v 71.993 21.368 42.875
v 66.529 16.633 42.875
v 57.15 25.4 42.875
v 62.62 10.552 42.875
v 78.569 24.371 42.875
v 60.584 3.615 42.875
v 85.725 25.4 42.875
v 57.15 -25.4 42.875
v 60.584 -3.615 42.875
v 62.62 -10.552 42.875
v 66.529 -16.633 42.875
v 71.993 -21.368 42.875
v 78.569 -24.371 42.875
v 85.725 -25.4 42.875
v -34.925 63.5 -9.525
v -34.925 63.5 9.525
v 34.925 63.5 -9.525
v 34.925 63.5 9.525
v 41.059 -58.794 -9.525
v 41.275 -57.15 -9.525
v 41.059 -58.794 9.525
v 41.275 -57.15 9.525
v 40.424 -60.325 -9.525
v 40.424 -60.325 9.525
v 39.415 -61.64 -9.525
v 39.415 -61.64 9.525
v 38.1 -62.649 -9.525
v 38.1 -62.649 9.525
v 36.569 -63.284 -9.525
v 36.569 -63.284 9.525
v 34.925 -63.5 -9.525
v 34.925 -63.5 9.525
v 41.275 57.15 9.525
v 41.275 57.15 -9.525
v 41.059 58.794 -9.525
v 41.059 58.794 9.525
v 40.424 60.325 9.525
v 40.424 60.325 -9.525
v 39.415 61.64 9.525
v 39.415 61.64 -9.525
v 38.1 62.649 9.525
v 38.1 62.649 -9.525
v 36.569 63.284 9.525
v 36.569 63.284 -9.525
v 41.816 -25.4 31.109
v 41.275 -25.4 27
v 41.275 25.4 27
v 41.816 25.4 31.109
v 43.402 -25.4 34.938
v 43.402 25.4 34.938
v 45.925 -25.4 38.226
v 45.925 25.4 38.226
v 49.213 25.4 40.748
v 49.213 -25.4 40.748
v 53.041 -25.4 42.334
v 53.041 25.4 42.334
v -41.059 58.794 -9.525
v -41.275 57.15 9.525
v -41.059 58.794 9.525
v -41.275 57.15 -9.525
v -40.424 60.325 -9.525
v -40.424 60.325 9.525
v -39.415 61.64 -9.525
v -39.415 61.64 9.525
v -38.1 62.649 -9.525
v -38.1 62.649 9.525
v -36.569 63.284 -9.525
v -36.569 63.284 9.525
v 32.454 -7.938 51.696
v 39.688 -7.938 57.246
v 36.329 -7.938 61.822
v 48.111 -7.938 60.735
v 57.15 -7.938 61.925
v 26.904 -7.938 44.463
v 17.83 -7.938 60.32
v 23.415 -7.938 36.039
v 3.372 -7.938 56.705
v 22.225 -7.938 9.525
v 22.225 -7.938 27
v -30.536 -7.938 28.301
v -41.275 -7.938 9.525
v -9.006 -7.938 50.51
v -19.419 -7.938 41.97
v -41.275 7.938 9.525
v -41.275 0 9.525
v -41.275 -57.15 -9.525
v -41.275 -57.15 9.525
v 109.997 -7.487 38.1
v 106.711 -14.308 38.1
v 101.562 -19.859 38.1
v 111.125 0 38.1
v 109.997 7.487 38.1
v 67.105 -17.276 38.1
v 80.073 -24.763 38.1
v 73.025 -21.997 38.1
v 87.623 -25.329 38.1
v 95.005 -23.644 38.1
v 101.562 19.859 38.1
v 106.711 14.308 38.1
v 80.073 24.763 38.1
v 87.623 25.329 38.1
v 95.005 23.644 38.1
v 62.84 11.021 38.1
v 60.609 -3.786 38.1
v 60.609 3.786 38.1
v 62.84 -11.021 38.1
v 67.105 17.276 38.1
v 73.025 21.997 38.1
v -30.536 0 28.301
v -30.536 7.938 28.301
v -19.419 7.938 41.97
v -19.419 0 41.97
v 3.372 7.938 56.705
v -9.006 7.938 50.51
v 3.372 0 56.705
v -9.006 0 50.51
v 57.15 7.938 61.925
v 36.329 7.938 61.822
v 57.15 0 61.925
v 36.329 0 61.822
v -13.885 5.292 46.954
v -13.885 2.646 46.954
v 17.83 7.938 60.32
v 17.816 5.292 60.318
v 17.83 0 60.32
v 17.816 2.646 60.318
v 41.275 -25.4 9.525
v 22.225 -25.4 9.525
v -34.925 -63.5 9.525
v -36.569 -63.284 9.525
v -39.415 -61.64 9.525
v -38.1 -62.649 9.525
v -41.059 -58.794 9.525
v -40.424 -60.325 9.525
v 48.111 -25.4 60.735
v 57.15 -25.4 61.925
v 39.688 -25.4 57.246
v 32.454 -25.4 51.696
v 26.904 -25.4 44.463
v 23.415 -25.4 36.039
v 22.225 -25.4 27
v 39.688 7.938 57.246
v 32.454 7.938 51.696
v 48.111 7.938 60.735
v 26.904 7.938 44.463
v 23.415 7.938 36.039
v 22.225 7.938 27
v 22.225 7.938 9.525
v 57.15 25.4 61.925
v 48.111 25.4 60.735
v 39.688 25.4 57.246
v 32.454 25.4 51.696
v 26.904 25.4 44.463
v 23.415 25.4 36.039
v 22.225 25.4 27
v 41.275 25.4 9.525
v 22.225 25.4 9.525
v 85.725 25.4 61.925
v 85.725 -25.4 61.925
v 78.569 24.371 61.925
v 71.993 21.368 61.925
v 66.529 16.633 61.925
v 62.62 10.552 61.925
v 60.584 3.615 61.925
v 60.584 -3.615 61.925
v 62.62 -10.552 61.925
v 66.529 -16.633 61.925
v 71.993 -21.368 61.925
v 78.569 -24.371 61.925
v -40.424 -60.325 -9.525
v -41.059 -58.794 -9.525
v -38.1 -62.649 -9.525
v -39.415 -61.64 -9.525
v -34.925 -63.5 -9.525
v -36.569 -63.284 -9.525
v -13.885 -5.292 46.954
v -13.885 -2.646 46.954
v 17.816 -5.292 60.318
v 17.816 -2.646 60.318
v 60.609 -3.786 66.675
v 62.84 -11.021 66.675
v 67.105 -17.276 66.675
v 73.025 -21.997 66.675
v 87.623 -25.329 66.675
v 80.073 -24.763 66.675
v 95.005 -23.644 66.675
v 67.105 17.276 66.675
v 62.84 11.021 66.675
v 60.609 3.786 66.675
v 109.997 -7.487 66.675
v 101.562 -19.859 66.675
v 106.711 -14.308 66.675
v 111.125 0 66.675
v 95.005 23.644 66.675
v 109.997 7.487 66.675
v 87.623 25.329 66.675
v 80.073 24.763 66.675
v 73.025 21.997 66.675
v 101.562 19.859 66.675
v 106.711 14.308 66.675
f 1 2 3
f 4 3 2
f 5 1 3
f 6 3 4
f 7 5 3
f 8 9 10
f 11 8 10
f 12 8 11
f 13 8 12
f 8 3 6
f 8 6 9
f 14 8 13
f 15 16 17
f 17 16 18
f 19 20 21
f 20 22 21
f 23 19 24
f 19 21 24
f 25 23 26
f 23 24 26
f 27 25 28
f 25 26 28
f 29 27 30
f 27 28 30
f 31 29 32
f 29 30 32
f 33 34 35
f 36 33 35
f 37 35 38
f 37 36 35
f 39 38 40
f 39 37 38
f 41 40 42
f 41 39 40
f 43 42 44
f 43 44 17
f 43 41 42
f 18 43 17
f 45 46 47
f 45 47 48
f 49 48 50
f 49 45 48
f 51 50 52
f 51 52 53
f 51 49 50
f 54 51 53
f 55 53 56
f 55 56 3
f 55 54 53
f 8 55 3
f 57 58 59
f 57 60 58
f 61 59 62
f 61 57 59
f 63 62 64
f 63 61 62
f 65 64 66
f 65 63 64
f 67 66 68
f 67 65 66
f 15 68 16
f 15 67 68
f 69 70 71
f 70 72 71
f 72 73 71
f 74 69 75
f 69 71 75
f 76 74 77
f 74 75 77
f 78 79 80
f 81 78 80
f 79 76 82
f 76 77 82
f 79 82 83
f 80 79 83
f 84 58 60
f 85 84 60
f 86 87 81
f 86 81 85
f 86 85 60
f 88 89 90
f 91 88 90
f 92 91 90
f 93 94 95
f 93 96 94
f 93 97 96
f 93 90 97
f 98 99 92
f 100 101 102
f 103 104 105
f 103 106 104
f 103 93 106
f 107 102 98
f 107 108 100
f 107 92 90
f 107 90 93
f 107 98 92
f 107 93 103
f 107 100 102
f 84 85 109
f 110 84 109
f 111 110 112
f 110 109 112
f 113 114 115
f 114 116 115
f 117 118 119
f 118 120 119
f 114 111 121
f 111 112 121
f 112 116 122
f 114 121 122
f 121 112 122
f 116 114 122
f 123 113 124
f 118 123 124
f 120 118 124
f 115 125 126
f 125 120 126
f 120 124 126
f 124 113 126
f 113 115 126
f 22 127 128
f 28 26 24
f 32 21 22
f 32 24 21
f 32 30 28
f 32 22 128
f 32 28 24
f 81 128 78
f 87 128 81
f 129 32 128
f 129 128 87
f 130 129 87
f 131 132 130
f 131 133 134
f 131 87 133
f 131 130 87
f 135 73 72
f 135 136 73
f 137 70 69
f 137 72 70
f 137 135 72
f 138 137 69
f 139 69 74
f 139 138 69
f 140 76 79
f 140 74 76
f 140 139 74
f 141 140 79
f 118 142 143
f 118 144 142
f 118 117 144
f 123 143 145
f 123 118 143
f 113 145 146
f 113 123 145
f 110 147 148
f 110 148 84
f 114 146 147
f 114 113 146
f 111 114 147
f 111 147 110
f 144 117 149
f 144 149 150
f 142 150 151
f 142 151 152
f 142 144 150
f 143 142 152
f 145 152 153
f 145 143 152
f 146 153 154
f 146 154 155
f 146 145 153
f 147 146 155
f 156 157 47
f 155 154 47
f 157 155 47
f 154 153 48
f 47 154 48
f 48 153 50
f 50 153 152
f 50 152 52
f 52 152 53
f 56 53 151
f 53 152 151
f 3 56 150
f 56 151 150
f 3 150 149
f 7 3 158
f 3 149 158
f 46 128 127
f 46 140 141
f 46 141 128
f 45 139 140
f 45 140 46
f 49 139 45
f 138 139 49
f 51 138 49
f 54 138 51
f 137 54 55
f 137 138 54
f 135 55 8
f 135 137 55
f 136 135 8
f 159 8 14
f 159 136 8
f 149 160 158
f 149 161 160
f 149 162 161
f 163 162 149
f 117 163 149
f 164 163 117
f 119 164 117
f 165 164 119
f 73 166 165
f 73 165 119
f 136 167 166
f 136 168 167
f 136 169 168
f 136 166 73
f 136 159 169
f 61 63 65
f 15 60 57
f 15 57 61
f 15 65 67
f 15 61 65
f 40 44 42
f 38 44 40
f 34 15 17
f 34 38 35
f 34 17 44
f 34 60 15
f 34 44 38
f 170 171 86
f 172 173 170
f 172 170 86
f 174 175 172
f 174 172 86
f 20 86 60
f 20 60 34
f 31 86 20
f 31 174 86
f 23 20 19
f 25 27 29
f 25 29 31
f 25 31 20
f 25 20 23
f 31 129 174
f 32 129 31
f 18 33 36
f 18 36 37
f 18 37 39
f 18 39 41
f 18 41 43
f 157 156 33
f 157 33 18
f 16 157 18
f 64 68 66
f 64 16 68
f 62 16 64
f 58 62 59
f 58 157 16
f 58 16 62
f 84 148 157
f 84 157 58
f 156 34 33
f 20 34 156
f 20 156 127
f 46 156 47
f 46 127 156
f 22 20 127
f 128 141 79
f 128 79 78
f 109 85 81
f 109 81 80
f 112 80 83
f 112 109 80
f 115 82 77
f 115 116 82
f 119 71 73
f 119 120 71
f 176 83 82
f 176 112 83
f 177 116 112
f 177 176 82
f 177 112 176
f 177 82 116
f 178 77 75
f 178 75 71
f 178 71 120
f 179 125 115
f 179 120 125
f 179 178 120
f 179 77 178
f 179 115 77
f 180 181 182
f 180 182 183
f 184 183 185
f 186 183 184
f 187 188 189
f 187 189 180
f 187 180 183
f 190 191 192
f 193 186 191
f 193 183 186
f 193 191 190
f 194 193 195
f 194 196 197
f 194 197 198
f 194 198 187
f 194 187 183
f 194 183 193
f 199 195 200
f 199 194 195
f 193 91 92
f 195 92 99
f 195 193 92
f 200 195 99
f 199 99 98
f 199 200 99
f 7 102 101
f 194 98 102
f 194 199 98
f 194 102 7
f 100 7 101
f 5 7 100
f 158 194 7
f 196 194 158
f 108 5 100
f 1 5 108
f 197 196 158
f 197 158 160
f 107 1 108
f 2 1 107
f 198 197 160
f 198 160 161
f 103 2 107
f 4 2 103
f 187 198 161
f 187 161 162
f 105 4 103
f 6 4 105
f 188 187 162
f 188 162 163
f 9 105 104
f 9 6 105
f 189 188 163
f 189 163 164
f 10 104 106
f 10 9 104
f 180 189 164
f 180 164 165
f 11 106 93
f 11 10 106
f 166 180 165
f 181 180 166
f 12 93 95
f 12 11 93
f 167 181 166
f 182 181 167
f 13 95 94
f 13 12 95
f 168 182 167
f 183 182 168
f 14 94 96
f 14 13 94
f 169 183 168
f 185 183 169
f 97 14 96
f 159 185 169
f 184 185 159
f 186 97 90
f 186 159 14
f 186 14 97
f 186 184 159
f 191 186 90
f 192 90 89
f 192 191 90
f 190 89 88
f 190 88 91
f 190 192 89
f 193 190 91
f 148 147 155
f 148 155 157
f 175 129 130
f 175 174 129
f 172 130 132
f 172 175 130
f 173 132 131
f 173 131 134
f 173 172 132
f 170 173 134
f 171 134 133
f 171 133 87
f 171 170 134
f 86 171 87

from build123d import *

# Parameters (mm, degrees)
F1_DEPTH = 63.5
F2_DEPTH = 25.4
F3_DEPTH = 7.9375
F5_R     = 6.35


with BuildPart() as f1:
    # F0 (on Front) → F1 (new body, symmetric)
    with BuildSketch(Plane.XZ):
        Polygon((-41.275, 9.525), (-41.275, -9.525), (41.275, -9.525), (41.275, 9.525), (22.225, 9.525), align=None)
    extrude(amount=F1_DEPTH, both=True)

    # F0 (on Front) → F2 (join, symmetric)
    with BuildSketch(Plane.XZ):
        with BuildLine():
            Line((22.225, 9.525), (41.275, 9.525))
            Line((41.275, 9.525), (41.275, 27.0002))
            ThreePointArc((41.275, 27.0002), (45.9246798487, 38.2255201513), (57.15, 42.8752))
            Line((57.15, 42.8752), (60.325, 42.8752))
            Line((60.325, 42.8752), (60.325, 61.9118876984))
            add(Edge.make_bspline(
                [(57.15, 61.9252), (58.2024017722, 61.9212196773), (59.2640962396, 61.9177081997), (60.325, 61.9118876984)],
                knots=[0.7123833019, 0.7123833019, 0.7123833019, 0.7123833019, 0.7293225906, 0.7293225906, 0.7293225906, 0.7293225906], degree=3))
            ThreePointArc((57.15, 61.9252), (32.4542956671, 51.6959043329), (22.225, 27.0002))
            Line((22.225, 27.0002), (22.225, 9.525))
        make_face()
        with BuildLine():
            Line((60.325, 61.9252), (57.15, 61.9252))
            add(Edge.make_bspline(
                [(57.15, 61.9252), (58.2024017722, 61.9212196773), (59.2640962396, 61.9177081997), (60.325, 61.9118876984)],
                knots=[0.7123833019, 0.7123833019, 0.7123833019, 0.7123833019, 0.7293225906, 0.7293225906, 0.7293225906, 0.7293225906], degree=3))
            Line((60.325, 61.9118876984), (60.325, 61.9252))
        make_face()
        Polygon((85.725, 61.9252), (60.325, 61.9252), (60.325, 61.9118876984), (60.325, 42.8752), (85.725, 42.8752), align=None)
    extrude(amount=F2_DEPTH, both=True)

    # F0 (on Front) → F3 (join, symmetric)
    with BuildSketch(Plane.XZ):
        with BuildLine():
            add(Edge.make_bspline(
                [(-41.275, 9.525), (-14.9323567748, 63.0891993642), (12.8911493683, 62.0925928269), (57.15, 61.9252)],
                knots=[0, 0, 0, 0, 0.7123833019, 0.7123833019, 0.7123833019, 0.7123833019], degree=3))
            Line((-41.275, 9.525), (22.225, 9.525))
            Line((22.225, 9.525), (22.225, 27.0002))
            ThreePointArc((22.225, 27.0002), (32.4542956671, 51.6959043329), (57.15, 61.9252))
        make_face()
    extrude(amount=F3_DEPTH, both=True)

    # F0 (on Front) → F4 (revolve)
    with BuildSketch(Plane.XZ):
        Polygon((85.725, 66.675), (85.725, 61.9252), (85.725, 42.8752), (85.725, 38.1), (111.125, 38.1), (111.125, 66.675), align=None)
    revolve(axis=Axis((85.725, 0, 52.3875), (0, 0, 1)))

    # F5
    f5_edges = [f1.edges().sort_by_distance(p)[0] for p in [
        (-41.275, -63.5, 0),
        (41.275, -63.5, 0),
        (41.275, 63.5, 0),
        (-41.275, 63.5, 0),
    ]]
    fillet(f5_edges, radius=F5_R)


solid = f1.part
